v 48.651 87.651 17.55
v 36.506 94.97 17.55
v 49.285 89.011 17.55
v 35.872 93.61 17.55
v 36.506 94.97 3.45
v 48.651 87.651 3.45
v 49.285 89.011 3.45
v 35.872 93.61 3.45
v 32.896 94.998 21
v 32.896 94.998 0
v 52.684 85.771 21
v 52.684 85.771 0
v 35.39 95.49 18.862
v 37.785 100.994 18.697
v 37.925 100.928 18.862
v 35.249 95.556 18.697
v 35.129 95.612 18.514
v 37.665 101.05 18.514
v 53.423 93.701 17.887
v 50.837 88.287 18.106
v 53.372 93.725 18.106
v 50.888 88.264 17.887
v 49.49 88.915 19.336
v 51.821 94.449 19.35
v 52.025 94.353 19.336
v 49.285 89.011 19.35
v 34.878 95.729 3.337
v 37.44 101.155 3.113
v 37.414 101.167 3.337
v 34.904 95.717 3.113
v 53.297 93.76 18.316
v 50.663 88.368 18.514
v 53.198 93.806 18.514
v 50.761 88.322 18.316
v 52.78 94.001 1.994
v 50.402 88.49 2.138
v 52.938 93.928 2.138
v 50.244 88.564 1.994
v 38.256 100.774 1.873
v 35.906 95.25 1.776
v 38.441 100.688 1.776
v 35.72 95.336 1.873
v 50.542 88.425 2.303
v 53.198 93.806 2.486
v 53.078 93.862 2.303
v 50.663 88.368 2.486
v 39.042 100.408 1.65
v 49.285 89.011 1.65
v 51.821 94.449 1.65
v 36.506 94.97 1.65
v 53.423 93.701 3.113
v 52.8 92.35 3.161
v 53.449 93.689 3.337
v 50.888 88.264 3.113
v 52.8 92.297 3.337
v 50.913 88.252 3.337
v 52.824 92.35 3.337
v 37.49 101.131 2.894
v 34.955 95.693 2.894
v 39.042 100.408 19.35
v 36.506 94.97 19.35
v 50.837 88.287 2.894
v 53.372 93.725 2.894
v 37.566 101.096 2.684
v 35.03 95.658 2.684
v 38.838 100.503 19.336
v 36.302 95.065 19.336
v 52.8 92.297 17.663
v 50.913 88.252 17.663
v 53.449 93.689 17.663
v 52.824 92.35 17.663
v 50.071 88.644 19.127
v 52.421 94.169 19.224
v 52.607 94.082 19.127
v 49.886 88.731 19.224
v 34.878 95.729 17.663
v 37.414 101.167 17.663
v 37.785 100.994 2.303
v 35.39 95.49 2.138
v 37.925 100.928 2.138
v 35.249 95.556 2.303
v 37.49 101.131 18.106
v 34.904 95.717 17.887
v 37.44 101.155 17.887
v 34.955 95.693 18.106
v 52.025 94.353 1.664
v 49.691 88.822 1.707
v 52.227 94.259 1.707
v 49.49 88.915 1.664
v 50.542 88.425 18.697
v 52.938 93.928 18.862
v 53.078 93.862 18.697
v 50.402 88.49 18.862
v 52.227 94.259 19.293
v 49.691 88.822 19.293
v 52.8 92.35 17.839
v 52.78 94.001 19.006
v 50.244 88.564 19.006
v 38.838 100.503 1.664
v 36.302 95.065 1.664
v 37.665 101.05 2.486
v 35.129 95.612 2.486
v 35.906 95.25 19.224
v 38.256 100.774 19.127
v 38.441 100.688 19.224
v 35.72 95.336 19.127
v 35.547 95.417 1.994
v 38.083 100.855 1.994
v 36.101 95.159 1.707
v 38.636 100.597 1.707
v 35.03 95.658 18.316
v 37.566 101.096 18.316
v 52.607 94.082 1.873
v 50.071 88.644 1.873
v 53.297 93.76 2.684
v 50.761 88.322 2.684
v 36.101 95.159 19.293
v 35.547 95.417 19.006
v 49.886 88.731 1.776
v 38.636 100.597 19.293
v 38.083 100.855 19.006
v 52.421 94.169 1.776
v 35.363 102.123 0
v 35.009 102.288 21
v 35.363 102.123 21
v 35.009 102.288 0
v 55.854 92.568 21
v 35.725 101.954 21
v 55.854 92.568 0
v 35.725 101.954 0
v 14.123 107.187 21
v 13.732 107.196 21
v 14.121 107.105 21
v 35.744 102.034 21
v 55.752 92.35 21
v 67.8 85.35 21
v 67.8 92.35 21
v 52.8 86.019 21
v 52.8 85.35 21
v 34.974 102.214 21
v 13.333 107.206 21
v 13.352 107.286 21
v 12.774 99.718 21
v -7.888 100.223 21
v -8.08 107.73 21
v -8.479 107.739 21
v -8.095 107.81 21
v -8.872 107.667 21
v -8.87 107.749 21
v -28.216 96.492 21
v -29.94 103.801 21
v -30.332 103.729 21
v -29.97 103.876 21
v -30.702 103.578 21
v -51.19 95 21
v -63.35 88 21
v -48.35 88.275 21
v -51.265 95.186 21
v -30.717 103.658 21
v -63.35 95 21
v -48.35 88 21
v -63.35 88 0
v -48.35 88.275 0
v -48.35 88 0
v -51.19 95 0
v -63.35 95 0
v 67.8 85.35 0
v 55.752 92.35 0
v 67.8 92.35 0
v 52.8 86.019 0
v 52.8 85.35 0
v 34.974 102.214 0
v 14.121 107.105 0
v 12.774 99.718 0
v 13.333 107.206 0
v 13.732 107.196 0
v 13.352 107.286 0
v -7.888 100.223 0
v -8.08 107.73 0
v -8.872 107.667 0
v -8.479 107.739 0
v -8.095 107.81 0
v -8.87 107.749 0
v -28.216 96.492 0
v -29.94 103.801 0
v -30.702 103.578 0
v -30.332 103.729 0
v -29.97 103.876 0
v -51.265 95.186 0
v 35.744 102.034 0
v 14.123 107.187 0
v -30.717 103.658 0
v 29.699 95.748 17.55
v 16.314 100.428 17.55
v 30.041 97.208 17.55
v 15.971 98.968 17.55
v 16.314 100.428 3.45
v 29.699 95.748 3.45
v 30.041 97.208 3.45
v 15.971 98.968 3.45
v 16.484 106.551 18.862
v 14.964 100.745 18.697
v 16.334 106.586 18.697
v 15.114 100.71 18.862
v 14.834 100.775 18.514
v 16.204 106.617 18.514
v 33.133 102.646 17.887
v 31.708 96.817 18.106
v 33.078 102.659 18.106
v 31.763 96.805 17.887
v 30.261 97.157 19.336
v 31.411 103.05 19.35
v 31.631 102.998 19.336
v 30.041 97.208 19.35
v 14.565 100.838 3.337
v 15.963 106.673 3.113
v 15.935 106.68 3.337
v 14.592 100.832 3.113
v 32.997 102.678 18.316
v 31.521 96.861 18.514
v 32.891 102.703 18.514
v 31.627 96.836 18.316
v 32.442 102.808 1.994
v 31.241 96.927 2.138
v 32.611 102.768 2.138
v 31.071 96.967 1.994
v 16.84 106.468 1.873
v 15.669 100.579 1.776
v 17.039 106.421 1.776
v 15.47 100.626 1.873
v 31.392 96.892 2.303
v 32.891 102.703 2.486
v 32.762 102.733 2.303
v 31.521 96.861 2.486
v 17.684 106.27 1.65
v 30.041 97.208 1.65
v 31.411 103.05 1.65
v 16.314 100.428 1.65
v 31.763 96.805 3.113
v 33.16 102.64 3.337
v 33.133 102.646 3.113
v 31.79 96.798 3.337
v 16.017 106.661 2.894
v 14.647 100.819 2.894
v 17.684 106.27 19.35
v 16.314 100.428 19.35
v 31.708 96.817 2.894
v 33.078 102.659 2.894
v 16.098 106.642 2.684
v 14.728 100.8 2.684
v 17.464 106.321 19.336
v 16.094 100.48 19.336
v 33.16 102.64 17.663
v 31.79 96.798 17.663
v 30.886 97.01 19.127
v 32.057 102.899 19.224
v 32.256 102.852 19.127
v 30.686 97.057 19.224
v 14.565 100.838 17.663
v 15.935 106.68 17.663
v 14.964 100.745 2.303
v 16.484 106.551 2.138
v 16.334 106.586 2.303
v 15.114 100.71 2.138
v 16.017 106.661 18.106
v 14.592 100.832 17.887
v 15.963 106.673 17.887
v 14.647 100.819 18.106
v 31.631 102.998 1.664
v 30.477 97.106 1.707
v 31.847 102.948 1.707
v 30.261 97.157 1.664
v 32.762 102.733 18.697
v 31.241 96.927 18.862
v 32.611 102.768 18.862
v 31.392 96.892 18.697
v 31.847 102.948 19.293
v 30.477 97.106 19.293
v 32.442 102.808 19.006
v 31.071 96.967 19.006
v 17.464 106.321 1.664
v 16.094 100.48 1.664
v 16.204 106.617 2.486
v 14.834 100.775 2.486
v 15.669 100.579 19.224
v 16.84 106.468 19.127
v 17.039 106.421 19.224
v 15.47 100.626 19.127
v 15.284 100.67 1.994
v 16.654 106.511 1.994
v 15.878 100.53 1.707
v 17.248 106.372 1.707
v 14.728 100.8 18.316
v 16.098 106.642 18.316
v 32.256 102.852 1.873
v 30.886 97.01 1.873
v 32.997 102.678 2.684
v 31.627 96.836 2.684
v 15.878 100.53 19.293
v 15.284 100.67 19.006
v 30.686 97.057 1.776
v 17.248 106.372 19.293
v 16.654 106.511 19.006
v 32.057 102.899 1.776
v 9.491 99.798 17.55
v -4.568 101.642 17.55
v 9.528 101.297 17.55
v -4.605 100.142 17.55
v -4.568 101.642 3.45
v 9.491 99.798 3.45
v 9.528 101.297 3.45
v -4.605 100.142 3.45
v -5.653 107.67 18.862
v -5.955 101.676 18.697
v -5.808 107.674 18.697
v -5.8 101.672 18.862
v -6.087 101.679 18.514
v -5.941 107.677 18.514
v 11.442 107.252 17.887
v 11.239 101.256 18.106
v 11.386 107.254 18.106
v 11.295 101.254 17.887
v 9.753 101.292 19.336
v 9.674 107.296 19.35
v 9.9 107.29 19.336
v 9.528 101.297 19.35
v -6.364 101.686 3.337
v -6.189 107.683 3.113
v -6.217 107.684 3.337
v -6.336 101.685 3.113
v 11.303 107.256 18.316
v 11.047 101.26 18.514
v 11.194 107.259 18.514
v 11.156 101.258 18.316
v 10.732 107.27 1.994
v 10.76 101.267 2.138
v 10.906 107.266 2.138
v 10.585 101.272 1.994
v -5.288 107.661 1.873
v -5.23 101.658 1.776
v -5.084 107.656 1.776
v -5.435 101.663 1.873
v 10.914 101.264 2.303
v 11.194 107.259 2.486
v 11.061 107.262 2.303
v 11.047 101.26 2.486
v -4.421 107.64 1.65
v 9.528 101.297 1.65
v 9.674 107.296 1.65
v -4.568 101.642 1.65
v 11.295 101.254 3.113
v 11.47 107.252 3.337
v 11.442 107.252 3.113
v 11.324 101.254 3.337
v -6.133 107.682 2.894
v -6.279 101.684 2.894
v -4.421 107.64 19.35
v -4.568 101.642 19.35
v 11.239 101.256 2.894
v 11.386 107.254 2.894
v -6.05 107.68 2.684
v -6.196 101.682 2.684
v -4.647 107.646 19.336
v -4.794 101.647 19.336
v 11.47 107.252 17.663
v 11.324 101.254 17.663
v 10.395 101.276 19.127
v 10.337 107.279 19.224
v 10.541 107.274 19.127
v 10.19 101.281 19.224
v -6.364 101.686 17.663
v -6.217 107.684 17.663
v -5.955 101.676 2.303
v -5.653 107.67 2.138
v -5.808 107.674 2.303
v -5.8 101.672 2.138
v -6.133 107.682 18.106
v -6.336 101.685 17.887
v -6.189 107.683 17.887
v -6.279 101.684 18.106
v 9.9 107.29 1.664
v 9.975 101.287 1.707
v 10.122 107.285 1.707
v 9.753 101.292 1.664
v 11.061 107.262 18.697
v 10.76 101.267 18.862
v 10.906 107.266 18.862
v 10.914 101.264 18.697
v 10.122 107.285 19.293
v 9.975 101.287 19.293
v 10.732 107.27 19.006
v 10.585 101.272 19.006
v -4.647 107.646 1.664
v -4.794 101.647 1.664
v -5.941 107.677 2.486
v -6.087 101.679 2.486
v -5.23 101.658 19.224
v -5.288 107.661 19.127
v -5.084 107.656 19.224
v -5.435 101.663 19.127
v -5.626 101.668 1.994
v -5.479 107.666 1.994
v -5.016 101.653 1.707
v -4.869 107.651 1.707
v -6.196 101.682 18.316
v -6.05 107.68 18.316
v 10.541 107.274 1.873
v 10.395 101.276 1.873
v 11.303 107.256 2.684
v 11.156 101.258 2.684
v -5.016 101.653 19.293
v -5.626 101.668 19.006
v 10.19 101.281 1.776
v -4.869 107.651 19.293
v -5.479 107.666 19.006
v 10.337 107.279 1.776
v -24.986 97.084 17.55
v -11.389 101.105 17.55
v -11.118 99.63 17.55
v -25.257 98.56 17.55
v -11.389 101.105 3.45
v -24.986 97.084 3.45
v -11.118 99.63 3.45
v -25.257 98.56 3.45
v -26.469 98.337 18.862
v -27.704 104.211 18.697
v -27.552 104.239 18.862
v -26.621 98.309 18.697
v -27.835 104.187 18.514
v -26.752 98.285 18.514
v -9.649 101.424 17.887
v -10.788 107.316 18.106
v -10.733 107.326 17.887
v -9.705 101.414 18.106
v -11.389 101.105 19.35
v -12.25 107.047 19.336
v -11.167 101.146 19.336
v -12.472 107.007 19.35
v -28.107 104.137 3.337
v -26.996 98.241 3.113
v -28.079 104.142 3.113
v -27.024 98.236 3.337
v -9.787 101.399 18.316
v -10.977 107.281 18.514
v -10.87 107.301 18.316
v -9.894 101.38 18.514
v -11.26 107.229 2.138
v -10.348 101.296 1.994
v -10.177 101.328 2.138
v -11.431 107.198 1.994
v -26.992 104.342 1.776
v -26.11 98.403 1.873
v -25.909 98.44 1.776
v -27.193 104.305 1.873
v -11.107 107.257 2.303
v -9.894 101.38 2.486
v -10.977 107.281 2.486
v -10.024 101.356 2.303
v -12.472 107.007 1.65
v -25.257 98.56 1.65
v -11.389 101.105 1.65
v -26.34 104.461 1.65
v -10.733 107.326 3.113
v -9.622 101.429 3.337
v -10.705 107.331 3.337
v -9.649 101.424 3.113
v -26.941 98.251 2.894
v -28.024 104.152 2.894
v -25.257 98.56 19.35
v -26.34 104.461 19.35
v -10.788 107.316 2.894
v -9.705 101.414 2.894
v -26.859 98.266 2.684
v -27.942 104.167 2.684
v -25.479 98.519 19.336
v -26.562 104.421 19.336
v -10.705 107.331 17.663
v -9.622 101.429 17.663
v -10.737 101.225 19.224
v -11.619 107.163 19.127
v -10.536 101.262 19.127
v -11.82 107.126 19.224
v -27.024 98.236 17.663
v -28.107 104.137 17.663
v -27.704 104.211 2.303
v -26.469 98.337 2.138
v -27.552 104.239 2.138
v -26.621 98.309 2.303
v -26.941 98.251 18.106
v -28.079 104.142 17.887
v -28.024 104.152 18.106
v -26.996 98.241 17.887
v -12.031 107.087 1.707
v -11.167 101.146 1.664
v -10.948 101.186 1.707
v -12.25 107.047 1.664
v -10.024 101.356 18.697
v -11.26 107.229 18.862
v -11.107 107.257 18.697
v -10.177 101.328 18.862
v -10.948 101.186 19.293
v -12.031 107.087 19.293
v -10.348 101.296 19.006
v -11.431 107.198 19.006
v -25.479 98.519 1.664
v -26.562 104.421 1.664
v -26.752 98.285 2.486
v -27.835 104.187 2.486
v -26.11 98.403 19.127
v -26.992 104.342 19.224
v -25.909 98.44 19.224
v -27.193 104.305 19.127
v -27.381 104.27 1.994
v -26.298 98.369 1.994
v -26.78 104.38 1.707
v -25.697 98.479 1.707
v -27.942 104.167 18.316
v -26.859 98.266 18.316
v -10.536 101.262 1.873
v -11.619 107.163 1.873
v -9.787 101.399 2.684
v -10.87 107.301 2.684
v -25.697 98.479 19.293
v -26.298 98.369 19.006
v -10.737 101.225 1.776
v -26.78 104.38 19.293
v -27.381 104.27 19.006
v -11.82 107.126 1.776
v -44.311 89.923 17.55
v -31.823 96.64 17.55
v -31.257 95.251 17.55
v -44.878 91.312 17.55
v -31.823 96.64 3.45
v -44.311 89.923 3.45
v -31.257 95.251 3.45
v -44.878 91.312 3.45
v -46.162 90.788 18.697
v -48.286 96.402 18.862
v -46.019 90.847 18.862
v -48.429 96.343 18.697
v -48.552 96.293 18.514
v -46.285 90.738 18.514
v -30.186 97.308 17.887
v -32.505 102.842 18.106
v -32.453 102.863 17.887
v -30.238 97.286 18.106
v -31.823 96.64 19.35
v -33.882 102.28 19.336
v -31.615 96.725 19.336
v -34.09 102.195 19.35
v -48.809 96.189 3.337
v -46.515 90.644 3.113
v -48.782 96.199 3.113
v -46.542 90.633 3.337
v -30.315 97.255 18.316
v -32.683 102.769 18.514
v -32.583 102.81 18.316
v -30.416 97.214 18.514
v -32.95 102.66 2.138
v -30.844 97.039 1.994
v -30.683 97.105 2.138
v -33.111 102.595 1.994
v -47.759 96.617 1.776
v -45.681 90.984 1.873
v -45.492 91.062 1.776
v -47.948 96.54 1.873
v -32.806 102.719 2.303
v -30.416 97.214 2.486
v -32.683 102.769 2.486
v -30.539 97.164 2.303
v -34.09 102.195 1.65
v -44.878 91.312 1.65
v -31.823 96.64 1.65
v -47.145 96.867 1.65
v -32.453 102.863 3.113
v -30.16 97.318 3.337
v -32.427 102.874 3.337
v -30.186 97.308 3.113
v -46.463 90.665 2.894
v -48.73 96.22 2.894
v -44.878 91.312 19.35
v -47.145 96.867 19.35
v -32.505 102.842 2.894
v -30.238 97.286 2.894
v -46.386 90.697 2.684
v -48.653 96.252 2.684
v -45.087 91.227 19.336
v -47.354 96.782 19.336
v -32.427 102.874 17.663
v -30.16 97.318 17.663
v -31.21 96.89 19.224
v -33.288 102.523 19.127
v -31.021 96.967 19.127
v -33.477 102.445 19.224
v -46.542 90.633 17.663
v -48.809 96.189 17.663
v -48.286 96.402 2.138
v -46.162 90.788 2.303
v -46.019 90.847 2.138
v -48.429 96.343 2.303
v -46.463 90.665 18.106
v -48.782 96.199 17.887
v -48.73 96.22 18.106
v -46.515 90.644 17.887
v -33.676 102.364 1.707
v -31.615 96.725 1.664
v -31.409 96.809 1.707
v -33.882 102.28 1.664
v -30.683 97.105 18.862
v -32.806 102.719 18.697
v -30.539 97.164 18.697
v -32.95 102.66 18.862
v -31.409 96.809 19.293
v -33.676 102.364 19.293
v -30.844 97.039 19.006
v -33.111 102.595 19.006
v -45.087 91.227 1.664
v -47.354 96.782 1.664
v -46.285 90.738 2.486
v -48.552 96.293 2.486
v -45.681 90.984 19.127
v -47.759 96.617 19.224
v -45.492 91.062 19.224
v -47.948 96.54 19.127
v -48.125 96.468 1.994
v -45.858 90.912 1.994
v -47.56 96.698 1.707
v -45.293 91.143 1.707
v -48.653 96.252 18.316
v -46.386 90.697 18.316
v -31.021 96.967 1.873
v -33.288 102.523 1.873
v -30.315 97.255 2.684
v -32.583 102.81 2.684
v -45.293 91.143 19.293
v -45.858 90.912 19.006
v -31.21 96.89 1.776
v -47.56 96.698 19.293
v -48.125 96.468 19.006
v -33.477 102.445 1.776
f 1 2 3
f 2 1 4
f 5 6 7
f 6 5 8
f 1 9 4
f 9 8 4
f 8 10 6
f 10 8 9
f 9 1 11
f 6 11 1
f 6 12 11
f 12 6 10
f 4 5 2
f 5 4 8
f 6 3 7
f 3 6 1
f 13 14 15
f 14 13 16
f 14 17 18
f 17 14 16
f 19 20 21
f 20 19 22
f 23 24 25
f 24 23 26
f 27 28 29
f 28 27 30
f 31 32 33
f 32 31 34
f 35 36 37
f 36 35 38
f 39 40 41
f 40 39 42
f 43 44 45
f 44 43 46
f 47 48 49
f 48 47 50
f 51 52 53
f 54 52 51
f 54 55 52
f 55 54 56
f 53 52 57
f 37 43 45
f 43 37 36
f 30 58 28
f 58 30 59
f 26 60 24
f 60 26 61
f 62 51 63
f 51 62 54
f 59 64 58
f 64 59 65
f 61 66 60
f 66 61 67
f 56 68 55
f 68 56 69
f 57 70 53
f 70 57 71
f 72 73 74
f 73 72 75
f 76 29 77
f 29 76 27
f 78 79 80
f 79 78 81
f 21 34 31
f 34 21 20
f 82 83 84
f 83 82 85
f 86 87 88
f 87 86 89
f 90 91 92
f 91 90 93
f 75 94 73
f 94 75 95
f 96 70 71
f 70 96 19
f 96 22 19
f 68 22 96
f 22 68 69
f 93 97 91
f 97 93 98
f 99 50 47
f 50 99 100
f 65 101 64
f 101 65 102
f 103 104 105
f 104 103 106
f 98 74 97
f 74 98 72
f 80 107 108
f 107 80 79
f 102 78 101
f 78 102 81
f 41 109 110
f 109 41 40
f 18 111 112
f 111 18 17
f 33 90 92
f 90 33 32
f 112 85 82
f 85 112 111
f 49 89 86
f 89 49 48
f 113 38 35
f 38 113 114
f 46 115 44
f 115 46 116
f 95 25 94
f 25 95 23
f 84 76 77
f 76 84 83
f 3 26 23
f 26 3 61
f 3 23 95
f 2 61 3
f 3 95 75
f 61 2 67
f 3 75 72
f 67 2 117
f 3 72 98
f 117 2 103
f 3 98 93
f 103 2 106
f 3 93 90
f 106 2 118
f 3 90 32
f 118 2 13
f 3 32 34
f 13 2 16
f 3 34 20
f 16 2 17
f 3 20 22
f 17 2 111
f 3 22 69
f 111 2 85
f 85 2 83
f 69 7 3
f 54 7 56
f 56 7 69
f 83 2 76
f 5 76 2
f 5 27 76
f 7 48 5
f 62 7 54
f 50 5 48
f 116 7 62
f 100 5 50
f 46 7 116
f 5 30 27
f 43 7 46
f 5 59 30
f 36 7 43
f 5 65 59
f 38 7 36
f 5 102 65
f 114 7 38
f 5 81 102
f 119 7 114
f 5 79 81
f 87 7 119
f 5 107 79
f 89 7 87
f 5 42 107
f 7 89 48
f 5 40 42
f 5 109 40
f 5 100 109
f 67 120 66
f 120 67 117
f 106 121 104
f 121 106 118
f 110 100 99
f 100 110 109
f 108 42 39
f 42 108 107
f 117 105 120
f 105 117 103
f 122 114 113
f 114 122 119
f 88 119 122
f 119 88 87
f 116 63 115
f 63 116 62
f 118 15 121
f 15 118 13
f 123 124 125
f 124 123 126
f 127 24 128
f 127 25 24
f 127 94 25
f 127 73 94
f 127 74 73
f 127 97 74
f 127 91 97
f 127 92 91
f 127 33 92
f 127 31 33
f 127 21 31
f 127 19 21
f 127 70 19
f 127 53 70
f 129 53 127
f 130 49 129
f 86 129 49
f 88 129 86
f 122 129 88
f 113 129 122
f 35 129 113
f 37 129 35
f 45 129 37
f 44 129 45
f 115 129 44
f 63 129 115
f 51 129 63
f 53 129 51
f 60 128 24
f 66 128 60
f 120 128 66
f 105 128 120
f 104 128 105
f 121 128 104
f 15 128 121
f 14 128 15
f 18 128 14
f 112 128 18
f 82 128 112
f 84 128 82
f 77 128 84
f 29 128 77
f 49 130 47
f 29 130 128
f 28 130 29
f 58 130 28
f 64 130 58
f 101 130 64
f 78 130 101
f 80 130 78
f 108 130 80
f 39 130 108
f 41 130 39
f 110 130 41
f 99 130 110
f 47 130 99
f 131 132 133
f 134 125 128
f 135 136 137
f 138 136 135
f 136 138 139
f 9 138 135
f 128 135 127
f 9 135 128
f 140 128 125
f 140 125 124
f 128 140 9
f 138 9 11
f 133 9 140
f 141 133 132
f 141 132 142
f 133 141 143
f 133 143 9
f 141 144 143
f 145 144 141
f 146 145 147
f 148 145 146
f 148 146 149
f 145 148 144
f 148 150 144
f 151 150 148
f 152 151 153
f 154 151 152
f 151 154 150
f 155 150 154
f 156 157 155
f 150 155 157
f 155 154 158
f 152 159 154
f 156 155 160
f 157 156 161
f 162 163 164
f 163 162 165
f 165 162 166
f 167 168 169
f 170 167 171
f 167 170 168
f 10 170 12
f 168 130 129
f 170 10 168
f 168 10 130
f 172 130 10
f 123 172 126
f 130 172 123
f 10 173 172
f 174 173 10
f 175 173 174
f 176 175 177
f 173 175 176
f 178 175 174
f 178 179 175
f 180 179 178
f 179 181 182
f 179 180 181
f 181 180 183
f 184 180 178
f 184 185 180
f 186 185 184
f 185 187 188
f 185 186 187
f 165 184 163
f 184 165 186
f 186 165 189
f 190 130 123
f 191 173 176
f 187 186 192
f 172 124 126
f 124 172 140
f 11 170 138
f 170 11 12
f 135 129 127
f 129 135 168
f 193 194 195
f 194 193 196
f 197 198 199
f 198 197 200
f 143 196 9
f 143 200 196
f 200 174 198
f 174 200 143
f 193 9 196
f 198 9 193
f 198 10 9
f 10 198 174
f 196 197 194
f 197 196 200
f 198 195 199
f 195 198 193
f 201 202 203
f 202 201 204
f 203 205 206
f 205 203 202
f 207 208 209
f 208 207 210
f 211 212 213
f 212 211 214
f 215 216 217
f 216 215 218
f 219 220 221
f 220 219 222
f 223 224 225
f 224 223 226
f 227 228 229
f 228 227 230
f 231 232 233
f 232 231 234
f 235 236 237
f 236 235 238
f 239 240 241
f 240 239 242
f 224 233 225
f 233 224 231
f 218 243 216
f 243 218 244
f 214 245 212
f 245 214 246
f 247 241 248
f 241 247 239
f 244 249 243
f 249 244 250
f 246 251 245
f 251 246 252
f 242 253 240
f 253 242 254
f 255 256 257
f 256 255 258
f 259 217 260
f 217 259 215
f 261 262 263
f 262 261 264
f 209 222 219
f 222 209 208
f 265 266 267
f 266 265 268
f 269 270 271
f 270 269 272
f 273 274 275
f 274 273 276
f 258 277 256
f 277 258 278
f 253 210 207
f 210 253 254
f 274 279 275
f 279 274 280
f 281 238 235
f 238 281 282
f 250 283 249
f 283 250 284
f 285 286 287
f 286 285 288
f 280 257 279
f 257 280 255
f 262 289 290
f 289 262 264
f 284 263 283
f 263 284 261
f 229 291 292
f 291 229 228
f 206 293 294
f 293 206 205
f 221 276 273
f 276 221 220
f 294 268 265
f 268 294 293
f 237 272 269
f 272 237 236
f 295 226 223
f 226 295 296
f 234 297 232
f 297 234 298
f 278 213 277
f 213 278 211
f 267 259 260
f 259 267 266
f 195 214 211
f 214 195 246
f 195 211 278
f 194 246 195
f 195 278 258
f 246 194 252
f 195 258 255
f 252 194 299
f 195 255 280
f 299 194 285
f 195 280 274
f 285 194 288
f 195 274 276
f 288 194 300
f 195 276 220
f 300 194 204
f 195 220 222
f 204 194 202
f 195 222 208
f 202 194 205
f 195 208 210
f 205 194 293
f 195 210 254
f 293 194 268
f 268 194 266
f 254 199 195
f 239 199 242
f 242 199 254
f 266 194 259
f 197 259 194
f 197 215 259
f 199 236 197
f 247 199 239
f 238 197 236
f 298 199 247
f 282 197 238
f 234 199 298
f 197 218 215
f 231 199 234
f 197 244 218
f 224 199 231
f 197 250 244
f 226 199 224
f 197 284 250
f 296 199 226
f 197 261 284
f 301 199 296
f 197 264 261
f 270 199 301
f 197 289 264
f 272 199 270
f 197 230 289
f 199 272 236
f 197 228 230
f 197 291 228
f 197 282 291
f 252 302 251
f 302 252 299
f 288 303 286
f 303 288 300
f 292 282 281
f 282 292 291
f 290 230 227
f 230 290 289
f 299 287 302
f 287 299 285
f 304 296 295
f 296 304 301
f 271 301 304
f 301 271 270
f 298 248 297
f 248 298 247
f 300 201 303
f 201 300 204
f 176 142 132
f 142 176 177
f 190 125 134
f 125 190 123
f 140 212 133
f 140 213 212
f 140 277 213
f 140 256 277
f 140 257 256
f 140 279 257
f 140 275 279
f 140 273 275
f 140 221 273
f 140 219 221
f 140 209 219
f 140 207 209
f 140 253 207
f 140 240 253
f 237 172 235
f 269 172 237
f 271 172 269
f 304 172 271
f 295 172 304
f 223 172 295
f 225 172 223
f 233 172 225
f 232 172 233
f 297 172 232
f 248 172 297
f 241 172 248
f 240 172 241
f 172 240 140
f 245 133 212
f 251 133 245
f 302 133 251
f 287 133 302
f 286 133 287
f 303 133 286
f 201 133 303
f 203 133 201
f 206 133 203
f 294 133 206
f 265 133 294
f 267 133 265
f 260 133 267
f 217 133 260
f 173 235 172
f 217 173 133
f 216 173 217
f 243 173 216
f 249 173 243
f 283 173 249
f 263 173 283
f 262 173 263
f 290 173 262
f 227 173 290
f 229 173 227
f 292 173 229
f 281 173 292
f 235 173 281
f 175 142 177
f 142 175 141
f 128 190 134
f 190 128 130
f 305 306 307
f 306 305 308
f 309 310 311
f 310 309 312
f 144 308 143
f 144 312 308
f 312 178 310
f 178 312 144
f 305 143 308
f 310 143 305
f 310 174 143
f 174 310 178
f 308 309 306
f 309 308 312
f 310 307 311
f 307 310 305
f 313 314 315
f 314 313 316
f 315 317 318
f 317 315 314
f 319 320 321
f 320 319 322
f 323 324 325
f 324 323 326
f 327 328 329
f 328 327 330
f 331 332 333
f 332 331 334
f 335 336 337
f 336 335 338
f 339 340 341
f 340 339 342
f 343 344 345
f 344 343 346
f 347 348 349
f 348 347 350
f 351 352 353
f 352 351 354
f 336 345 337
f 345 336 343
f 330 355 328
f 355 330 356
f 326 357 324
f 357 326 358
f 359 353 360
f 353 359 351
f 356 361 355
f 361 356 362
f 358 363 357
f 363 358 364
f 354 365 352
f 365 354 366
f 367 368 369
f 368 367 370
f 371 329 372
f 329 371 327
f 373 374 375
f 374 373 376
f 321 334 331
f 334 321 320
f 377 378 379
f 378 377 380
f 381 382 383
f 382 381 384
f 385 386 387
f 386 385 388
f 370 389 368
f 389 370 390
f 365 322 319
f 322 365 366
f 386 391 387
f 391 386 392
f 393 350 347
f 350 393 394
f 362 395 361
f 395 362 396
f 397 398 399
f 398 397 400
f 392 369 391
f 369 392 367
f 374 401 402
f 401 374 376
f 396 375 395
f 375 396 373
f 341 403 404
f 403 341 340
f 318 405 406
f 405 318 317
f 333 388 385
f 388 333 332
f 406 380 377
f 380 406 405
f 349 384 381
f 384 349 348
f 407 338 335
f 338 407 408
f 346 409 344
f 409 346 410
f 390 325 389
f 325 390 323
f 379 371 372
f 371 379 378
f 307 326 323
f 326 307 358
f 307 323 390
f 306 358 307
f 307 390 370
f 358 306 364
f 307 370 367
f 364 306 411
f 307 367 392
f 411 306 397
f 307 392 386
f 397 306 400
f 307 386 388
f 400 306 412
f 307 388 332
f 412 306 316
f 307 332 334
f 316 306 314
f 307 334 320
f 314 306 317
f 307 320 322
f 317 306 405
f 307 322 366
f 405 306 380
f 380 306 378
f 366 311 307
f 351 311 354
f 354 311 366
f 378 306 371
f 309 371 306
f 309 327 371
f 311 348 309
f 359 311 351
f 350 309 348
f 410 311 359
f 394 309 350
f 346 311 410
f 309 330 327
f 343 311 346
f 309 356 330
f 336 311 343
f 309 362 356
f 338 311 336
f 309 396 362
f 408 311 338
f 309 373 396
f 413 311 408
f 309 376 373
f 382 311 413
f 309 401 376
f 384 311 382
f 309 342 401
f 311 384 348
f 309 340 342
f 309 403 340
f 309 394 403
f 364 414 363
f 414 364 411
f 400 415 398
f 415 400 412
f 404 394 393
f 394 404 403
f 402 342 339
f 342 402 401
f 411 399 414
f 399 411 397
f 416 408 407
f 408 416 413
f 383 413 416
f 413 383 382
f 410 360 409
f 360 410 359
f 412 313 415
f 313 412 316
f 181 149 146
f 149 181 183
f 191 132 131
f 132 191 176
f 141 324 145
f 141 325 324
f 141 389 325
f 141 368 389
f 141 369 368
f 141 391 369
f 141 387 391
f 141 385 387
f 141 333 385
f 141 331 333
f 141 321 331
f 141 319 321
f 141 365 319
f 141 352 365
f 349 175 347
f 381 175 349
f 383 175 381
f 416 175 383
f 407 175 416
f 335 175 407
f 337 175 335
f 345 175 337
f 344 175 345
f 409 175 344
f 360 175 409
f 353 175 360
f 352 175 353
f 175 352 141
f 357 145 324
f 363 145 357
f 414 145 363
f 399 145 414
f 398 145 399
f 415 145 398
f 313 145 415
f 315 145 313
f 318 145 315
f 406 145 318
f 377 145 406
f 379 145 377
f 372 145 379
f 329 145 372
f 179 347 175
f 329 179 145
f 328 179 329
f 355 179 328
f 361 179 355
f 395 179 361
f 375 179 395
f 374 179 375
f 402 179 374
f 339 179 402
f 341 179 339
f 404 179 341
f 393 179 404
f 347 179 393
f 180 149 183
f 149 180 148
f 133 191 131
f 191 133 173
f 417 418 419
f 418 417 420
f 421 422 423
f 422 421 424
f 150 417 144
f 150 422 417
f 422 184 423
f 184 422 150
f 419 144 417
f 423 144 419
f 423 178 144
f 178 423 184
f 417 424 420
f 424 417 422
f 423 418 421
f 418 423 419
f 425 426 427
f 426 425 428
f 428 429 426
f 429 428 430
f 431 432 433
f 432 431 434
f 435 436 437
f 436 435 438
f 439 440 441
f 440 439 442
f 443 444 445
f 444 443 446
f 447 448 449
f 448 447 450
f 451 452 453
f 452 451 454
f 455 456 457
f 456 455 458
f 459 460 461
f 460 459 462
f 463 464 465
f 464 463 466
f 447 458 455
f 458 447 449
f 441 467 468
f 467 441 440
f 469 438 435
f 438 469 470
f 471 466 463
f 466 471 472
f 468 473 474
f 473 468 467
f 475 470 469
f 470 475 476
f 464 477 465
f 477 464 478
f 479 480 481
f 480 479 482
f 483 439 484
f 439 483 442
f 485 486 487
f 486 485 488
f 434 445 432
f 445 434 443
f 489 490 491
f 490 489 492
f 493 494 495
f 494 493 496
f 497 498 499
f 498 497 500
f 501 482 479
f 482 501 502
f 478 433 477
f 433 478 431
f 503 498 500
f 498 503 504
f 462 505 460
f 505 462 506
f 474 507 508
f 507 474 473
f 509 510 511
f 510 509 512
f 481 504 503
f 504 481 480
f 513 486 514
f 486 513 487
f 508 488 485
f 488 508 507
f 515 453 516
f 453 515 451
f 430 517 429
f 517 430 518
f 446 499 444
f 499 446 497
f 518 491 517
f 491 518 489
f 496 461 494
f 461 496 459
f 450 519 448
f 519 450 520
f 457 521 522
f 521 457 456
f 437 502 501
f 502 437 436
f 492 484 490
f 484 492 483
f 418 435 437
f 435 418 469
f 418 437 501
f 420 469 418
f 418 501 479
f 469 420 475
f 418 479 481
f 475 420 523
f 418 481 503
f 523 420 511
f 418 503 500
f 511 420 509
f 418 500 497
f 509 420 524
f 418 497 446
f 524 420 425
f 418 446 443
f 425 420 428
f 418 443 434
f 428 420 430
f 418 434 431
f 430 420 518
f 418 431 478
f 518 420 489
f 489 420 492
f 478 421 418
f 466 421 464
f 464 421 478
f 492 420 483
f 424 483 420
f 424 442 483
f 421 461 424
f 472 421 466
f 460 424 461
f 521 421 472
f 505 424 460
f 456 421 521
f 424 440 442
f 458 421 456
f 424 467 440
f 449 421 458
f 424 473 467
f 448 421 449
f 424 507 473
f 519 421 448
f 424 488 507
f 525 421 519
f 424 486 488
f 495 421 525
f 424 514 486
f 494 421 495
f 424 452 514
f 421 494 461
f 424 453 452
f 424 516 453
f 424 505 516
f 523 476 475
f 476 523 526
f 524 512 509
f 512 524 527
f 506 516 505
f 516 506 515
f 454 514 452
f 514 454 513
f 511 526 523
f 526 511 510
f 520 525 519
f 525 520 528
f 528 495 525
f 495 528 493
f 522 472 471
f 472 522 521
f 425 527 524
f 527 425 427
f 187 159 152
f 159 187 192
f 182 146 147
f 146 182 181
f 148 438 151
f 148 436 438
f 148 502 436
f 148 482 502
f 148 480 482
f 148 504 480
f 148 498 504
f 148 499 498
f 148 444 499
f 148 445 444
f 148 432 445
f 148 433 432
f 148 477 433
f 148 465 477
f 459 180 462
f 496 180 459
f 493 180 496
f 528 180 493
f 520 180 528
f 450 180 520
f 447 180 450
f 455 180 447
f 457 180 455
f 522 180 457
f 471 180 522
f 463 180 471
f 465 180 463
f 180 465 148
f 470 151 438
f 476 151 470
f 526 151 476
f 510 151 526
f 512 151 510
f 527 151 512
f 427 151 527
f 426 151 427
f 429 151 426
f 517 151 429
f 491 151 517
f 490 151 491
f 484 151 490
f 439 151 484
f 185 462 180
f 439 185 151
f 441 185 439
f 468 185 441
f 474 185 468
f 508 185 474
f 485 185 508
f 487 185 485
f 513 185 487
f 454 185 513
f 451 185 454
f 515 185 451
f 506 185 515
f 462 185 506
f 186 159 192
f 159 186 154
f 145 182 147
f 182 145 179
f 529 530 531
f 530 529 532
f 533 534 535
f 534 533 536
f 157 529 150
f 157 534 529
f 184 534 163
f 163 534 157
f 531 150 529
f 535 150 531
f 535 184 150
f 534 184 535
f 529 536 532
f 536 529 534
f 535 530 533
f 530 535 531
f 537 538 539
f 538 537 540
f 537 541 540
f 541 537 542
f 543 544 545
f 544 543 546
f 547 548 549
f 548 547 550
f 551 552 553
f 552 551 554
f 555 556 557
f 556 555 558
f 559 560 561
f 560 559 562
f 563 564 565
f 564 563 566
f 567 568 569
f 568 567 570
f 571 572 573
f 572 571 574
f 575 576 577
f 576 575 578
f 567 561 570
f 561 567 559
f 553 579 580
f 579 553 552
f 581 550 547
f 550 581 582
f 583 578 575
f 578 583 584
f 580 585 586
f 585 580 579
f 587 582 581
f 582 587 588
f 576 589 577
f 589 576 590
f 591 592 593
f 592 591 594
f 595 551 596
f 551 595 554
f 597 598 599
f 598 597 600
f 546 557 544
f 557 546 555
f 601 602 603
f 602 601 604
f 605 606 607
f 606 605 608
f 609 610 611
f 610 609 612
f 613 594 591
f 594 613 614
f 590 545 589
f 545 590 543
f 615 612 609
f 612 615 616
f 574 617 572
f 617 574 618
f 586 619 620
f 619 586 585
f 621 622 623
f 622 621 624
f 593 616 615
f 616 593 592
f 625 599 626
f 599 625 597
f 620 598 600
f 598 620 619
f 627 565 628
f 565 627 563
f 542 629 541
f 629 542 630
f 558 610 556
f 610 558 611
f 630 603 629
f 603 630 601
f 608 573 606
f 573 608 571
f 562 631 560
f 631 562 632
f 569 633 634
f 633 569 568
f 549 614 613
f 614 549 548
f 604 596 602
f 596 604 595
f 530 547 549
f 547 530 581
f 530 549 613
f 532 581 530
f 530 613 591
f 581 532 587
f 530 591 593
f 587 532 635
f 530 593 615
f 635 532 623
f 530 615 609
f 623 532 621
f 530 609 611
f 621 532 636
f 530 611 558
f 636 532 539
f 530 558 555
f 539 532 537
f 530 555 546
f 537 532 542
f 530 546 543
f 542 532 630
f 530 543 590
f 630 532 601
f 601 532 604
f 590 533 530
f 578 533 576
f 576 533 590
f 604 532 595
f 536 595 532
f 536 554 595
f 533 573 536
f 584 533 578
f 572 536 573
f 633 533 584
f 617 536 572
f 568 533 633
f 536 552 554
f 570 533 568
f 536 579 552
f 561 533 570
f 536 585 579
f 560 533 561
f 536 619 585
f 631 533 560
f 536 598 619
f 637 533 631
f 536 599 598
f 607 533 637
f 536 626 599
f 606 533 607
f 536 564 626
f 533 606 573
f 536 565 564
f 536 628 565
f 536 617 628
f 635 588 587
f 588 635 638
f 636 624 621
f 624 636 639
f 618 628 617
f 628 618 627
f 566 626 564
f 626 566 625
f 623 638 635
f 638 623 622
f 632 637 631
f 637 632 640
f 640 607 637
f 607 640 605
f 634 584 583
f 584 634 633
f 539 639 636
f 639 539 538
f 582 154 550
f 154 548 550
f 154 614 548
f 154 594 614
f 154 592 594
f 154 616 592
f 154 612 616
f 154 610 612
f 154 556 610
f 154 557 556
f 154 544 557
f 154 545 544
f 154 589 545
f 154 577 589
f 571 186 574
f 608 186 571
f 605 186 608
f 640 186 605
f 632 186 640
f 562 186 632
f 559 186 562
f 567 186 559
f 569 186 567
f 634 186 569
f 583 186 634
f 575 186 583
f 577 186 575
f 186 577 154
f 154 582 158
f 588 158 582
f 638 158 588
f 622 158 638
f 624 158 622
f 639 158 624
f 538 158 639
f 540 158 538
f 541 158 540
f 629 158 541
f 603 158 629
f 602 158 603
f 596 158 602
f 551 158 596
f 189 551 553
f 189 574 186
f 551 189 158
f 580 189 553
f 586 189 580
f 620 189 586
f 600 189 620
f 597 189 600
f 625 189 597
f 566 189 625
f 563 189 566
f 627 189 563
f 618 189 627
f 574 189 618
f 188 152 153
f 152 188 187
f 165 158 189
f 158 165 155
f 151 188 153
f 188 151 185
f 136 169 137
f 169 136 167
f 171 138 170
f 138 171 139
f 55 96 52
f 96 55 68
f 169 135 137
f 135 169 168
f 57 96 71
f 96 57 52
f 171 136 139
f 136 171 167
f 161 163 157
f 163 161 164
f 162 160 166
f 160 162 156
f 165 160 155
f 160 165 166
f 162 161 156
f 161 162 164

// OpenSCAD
cherry=14.1;
cherrylip=1.5;
cherryspace=1.8;

capclearh=20;
capclearw=15;

$fn=50;
knuckLen = 100;
keyw= 21;
keyl = 23;
keyd = cherrylip + 6;
transl=(keyl-cherry)/2;
transw=(keyw-cherry)/2;

// left and right braces
translate([52.8,85.35,0])
cube([15,7,keyw]);
translate([-63.35,88,0])
cube([15,7,keyw]);


//pieces
for(z=[65:11.8:120]){
rotate(a= [0,0,z])
translate([knuckLen,-keyl/2,0])
difference(){
	union(){
cube([keyd,keyl,keyw]);
//keycap simulator
//translate([-capclearh,transl/2+cherrylip*2,transw]){
//		cube([capclearh,capclearw,capclearw]);	
//}
//end keycap
}
translate([0,transl,transw]){
cube([keyd,cherry,cherry]);
translate([cherrylip,-cherryspace/2,-cherryspace/2]){
minkowski(){
cube([keyd,cherry,cherry]);
rotate([0,90,0])
translate([-cherryspace/2,cherryspace/2,0])
cylinder(r=cherryspace,h=keyd);
}
}
}
}
}
